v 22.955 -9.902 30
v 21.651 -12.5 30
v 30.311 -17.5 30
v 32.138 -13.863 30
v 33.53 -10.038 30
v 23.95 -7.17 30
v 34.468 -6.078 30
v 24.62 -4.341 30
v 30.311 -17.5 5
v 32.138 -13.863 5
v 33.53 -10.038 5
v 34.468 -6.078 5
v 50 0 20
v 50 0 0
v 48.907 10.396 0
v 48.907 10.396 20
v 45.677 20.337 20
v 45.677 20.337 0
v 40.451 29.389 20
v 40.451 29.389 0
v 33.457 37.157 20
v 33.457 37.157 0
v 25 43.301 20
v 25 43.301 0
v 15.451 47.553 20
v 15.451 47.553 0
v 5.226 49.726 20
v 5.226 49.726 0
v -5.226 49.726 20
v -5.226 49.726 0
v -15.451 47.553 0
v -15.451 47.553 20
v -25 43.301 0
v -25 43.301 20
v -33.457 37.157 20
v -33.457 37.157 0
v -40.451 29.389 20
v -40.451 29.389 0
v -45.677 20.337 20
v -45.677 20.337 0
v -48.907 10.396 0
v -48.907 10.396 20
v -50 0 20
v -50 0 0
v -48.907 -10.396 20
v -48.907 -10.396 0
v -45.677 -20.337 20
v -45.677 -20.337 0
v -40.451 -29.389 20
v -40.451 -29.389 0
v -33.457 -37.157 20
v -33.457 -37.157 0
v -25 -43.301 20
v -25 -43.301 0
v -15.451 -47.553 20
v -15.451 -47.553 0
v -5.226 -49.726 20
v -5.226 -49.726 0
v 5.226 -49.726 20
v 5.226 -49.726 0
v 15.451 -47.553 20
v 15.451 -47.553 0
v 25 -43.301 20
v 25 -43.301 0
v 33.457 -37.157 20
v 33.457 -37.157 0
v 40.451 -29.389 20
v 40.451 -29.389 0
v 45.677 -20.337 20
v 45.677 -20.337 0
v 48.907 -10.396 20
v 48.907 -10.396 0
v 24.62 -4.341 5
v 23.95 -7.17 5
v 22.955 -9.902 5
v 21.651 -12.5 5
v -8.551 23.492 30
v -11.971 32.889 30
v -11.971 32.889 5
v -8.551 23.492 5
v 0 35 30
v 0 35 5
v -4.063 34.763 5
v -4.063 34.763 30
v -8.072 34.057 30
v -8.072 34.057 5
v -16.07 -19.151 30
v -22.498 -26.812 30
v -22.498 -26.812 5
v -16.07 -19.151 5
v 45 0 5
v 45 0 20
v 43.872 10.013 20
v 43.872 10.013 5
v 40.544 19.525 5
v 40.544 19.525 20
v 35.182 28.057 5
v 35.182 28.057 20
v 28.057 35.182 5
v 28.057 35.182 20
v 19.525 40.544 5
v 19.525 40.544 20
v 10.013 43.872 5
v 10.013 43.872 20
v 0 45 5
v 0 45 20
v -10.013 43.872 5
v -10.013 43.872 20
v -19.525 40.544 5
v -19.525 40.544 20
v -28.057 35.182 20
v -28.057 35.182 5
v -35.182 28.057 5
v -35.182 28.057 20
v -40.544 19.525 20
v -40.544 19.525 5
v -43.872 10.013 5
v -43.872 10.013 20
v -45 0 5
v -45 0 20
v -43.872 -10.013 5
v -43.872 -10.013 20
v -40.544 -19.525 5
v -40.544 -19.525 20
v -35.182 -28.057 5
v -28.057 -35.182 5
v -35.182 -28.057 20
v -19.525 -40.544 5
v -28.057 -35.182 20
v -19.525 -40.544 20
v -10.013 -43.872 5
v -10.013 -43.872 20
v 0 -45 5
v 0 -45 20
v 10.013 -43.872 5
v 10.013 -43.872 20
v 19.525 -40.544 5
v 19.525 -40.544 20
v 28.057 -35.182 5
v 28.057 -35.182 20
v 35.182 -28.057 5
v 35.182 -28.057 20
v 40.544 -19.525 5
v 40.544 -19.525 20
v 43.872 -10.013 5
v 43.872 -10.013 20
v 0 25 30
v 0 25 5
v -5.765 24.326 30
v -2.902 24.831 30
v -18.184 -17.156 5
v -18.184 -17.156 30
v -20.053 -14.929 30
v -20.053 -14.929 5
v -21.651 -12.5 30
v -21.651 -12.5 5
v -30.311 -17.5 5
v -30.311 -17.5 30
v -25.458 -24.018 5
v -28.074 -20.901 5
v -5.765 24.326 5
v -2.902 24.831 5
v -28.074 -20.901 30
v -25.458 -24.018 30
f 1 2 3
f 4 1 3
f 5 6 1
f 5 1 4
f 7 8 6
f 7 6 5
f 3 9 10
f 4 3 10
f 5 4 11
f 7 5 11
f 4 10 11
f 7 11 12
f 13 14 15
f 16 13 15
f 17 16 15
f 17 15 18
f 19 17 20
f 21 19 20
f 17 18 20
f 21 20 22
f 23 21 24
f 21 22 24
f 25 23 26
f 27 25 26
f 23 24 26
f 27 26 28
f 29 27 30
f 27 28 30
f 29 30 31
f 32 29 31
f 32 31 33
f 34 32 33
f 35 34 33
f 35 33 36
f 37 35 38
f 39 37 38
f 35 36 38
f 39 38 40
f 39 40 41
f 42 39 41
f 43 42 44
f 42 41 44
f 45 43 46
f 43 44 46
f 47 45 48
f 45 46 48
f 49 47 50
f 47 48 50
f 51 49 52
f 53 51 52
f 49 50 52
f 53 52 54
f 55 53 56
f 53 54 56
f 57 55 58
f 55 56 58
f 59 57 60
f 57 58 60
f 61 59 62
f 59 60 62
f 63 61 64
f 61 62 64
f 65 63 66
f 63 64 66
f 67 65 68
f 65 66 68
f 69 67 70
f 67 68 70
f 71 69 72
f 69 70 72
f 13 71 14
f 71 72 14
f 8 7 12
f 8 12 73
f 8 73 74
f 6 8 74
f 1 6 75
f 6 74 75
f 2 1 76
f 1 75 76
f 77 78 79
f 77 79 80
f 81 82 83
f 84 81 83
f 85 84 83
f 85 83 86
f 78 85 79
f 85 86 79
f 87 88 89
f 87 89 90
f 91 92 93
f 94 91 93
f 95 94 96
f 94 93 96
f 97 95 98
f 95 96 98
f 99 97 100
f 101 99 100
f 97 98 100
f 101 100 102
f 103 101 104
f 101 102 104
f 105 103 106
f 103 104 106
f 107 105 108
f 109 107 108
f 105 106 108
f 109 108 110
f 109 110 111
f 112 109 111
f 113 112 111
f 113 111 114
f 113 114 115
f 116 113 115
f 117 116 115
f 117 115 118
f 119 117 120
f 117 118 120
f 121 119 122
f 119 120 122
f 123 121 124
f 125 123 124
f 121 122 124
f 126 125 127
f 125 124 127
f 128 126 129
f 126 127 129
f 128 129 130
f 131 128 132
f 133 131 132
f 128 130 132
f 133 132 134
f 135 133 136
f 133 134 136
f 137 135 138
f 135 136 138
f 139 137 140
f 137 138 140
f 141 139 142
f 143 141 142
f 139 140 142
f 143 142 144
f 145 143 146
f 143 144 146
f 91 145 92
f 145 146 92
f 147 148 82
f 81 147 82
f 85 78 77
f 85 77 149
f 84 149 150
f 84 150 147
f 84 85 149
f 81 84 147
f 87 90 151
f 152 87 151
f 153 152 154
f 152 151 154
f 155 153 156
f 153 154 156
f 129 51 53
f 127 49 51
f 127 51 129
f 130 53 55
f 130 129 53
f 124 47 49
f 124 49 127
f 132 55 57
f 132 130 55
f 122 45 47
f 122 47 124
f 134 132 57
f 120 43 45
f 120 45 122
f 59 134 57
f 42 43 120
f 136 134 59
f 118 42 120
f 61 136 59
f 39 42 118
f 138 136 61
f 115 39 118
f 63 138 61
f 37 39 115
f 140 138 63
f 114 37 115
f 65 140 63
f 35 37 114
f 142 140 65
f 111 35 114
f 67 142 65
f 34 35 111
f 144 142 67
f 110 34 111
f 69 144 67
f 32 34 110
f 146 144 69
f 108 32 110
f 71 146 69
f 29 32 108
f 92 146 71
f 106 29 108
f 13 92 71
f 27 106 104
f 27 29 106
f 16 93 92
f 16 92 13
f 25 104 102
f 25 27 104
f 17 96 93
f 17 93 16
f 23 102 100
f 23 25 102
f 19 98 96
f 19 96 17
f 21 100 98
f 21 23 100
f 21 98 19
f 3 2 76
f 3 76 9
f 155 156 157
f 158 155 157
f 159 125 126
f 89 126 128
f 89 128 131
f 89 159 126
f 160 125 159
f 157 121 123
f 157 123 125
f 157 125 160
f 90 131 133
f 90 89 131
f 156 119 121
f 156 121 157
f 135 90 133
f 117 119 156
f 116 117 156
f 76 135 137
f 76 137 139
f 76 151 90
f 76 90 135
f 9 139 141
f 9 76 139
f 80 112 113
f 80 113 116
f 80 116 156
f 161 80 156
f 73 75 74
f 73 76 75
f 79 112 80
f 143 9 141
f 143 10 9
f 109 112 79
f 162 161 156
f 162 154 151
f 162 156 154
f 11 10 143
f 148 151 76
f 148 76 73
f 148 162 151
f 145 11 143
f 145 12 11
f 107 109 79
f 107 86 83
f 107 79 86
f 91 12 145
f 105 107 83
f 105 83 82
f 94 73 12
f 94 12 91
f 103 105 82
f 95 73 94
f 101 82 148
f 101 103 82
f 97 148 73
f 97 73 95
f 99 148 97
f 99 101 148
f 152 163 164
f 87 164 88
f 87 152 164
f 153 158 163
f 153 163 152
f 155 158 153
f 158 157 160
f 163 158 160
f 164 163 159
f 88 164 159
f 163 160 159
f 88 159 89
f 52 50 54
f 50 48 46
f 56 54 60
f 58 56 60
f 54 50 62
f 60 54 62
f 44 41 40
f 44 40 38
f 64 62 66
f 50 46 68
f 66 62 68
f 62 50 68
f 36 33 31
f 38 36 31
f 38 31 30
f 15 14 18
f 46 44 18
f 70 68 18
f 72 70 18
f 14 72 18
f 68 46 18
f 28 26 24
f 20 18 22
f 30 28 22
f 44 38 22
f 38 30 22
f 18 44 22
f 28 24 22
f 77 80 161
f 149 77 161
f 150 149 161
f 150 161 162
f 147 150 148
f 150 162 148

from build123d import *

# Parameters (mm, degrees)
F0_R     = 50
F1_DEPTH = 20
F2_R     = 45
F3_DEPTH = 15
F5_DEPTH = 25


with BuildPart() as f1:
    # F0 (on Top) → F1 (new body)
    with BuildSketch(Plane.XY):
        Circle(F0_R)
    extrude(amount=F1_DEPTH)

    # F2 (on face) → F3 (cut)
    with BuildSketch(Plane.XY.offset(20)):
        Circle(F2_R)
    extrude(amount=-F3_DEPTH, mode=Mode.SUBTRACT)

    # F4 (on face) → F5 (join)
    with BuildSketch(Plane.XY.offset(5)):
        with BuildLine():
            ThreePointArc((0, 35), (-6.077686, 34.468271), (-11.970705, 32.889242))
            Line((-11.970705, 32.889242), (-8.550504, 23.492316))
            ThreePointArc((-8.550504, 23.492316), (-4.341204, 24.620194), (0, 25))
            Line((0, 25), (0, 35))
        make_face()
        with BuildLine():
            ThreePointArc((-30.310889, -17.5), (-26.811556, -22.497566), (-22.497566, -26.811556))
            Line((-22.497566, -26.811556), (-16.06969, -19.151111))
            ThreePointArc((-16.06969, -19.151111), (-19.151111, -16.06969), (-21.650635, -12.5))
            Line((-21.650635, -12.5), (-30.310889, -17.5))
        make_face()
        with BuildLine():
            ThreePointArc((30.310889, -17.5), (32.889242, -11.970705), (34.468271, -6.077686))
            Line((34.468271, -6.077686), (24.620194, -4.341204))
            ThreePointArc((24.620194, -4.341204), (23.492316, -8.550504), (21.650635, -12.5))
            Line((21.650635, -12.5), (30.310889, -17.5))
        make_face()
    extrude(amount=F5_DEPTH)


solid = f1.part
